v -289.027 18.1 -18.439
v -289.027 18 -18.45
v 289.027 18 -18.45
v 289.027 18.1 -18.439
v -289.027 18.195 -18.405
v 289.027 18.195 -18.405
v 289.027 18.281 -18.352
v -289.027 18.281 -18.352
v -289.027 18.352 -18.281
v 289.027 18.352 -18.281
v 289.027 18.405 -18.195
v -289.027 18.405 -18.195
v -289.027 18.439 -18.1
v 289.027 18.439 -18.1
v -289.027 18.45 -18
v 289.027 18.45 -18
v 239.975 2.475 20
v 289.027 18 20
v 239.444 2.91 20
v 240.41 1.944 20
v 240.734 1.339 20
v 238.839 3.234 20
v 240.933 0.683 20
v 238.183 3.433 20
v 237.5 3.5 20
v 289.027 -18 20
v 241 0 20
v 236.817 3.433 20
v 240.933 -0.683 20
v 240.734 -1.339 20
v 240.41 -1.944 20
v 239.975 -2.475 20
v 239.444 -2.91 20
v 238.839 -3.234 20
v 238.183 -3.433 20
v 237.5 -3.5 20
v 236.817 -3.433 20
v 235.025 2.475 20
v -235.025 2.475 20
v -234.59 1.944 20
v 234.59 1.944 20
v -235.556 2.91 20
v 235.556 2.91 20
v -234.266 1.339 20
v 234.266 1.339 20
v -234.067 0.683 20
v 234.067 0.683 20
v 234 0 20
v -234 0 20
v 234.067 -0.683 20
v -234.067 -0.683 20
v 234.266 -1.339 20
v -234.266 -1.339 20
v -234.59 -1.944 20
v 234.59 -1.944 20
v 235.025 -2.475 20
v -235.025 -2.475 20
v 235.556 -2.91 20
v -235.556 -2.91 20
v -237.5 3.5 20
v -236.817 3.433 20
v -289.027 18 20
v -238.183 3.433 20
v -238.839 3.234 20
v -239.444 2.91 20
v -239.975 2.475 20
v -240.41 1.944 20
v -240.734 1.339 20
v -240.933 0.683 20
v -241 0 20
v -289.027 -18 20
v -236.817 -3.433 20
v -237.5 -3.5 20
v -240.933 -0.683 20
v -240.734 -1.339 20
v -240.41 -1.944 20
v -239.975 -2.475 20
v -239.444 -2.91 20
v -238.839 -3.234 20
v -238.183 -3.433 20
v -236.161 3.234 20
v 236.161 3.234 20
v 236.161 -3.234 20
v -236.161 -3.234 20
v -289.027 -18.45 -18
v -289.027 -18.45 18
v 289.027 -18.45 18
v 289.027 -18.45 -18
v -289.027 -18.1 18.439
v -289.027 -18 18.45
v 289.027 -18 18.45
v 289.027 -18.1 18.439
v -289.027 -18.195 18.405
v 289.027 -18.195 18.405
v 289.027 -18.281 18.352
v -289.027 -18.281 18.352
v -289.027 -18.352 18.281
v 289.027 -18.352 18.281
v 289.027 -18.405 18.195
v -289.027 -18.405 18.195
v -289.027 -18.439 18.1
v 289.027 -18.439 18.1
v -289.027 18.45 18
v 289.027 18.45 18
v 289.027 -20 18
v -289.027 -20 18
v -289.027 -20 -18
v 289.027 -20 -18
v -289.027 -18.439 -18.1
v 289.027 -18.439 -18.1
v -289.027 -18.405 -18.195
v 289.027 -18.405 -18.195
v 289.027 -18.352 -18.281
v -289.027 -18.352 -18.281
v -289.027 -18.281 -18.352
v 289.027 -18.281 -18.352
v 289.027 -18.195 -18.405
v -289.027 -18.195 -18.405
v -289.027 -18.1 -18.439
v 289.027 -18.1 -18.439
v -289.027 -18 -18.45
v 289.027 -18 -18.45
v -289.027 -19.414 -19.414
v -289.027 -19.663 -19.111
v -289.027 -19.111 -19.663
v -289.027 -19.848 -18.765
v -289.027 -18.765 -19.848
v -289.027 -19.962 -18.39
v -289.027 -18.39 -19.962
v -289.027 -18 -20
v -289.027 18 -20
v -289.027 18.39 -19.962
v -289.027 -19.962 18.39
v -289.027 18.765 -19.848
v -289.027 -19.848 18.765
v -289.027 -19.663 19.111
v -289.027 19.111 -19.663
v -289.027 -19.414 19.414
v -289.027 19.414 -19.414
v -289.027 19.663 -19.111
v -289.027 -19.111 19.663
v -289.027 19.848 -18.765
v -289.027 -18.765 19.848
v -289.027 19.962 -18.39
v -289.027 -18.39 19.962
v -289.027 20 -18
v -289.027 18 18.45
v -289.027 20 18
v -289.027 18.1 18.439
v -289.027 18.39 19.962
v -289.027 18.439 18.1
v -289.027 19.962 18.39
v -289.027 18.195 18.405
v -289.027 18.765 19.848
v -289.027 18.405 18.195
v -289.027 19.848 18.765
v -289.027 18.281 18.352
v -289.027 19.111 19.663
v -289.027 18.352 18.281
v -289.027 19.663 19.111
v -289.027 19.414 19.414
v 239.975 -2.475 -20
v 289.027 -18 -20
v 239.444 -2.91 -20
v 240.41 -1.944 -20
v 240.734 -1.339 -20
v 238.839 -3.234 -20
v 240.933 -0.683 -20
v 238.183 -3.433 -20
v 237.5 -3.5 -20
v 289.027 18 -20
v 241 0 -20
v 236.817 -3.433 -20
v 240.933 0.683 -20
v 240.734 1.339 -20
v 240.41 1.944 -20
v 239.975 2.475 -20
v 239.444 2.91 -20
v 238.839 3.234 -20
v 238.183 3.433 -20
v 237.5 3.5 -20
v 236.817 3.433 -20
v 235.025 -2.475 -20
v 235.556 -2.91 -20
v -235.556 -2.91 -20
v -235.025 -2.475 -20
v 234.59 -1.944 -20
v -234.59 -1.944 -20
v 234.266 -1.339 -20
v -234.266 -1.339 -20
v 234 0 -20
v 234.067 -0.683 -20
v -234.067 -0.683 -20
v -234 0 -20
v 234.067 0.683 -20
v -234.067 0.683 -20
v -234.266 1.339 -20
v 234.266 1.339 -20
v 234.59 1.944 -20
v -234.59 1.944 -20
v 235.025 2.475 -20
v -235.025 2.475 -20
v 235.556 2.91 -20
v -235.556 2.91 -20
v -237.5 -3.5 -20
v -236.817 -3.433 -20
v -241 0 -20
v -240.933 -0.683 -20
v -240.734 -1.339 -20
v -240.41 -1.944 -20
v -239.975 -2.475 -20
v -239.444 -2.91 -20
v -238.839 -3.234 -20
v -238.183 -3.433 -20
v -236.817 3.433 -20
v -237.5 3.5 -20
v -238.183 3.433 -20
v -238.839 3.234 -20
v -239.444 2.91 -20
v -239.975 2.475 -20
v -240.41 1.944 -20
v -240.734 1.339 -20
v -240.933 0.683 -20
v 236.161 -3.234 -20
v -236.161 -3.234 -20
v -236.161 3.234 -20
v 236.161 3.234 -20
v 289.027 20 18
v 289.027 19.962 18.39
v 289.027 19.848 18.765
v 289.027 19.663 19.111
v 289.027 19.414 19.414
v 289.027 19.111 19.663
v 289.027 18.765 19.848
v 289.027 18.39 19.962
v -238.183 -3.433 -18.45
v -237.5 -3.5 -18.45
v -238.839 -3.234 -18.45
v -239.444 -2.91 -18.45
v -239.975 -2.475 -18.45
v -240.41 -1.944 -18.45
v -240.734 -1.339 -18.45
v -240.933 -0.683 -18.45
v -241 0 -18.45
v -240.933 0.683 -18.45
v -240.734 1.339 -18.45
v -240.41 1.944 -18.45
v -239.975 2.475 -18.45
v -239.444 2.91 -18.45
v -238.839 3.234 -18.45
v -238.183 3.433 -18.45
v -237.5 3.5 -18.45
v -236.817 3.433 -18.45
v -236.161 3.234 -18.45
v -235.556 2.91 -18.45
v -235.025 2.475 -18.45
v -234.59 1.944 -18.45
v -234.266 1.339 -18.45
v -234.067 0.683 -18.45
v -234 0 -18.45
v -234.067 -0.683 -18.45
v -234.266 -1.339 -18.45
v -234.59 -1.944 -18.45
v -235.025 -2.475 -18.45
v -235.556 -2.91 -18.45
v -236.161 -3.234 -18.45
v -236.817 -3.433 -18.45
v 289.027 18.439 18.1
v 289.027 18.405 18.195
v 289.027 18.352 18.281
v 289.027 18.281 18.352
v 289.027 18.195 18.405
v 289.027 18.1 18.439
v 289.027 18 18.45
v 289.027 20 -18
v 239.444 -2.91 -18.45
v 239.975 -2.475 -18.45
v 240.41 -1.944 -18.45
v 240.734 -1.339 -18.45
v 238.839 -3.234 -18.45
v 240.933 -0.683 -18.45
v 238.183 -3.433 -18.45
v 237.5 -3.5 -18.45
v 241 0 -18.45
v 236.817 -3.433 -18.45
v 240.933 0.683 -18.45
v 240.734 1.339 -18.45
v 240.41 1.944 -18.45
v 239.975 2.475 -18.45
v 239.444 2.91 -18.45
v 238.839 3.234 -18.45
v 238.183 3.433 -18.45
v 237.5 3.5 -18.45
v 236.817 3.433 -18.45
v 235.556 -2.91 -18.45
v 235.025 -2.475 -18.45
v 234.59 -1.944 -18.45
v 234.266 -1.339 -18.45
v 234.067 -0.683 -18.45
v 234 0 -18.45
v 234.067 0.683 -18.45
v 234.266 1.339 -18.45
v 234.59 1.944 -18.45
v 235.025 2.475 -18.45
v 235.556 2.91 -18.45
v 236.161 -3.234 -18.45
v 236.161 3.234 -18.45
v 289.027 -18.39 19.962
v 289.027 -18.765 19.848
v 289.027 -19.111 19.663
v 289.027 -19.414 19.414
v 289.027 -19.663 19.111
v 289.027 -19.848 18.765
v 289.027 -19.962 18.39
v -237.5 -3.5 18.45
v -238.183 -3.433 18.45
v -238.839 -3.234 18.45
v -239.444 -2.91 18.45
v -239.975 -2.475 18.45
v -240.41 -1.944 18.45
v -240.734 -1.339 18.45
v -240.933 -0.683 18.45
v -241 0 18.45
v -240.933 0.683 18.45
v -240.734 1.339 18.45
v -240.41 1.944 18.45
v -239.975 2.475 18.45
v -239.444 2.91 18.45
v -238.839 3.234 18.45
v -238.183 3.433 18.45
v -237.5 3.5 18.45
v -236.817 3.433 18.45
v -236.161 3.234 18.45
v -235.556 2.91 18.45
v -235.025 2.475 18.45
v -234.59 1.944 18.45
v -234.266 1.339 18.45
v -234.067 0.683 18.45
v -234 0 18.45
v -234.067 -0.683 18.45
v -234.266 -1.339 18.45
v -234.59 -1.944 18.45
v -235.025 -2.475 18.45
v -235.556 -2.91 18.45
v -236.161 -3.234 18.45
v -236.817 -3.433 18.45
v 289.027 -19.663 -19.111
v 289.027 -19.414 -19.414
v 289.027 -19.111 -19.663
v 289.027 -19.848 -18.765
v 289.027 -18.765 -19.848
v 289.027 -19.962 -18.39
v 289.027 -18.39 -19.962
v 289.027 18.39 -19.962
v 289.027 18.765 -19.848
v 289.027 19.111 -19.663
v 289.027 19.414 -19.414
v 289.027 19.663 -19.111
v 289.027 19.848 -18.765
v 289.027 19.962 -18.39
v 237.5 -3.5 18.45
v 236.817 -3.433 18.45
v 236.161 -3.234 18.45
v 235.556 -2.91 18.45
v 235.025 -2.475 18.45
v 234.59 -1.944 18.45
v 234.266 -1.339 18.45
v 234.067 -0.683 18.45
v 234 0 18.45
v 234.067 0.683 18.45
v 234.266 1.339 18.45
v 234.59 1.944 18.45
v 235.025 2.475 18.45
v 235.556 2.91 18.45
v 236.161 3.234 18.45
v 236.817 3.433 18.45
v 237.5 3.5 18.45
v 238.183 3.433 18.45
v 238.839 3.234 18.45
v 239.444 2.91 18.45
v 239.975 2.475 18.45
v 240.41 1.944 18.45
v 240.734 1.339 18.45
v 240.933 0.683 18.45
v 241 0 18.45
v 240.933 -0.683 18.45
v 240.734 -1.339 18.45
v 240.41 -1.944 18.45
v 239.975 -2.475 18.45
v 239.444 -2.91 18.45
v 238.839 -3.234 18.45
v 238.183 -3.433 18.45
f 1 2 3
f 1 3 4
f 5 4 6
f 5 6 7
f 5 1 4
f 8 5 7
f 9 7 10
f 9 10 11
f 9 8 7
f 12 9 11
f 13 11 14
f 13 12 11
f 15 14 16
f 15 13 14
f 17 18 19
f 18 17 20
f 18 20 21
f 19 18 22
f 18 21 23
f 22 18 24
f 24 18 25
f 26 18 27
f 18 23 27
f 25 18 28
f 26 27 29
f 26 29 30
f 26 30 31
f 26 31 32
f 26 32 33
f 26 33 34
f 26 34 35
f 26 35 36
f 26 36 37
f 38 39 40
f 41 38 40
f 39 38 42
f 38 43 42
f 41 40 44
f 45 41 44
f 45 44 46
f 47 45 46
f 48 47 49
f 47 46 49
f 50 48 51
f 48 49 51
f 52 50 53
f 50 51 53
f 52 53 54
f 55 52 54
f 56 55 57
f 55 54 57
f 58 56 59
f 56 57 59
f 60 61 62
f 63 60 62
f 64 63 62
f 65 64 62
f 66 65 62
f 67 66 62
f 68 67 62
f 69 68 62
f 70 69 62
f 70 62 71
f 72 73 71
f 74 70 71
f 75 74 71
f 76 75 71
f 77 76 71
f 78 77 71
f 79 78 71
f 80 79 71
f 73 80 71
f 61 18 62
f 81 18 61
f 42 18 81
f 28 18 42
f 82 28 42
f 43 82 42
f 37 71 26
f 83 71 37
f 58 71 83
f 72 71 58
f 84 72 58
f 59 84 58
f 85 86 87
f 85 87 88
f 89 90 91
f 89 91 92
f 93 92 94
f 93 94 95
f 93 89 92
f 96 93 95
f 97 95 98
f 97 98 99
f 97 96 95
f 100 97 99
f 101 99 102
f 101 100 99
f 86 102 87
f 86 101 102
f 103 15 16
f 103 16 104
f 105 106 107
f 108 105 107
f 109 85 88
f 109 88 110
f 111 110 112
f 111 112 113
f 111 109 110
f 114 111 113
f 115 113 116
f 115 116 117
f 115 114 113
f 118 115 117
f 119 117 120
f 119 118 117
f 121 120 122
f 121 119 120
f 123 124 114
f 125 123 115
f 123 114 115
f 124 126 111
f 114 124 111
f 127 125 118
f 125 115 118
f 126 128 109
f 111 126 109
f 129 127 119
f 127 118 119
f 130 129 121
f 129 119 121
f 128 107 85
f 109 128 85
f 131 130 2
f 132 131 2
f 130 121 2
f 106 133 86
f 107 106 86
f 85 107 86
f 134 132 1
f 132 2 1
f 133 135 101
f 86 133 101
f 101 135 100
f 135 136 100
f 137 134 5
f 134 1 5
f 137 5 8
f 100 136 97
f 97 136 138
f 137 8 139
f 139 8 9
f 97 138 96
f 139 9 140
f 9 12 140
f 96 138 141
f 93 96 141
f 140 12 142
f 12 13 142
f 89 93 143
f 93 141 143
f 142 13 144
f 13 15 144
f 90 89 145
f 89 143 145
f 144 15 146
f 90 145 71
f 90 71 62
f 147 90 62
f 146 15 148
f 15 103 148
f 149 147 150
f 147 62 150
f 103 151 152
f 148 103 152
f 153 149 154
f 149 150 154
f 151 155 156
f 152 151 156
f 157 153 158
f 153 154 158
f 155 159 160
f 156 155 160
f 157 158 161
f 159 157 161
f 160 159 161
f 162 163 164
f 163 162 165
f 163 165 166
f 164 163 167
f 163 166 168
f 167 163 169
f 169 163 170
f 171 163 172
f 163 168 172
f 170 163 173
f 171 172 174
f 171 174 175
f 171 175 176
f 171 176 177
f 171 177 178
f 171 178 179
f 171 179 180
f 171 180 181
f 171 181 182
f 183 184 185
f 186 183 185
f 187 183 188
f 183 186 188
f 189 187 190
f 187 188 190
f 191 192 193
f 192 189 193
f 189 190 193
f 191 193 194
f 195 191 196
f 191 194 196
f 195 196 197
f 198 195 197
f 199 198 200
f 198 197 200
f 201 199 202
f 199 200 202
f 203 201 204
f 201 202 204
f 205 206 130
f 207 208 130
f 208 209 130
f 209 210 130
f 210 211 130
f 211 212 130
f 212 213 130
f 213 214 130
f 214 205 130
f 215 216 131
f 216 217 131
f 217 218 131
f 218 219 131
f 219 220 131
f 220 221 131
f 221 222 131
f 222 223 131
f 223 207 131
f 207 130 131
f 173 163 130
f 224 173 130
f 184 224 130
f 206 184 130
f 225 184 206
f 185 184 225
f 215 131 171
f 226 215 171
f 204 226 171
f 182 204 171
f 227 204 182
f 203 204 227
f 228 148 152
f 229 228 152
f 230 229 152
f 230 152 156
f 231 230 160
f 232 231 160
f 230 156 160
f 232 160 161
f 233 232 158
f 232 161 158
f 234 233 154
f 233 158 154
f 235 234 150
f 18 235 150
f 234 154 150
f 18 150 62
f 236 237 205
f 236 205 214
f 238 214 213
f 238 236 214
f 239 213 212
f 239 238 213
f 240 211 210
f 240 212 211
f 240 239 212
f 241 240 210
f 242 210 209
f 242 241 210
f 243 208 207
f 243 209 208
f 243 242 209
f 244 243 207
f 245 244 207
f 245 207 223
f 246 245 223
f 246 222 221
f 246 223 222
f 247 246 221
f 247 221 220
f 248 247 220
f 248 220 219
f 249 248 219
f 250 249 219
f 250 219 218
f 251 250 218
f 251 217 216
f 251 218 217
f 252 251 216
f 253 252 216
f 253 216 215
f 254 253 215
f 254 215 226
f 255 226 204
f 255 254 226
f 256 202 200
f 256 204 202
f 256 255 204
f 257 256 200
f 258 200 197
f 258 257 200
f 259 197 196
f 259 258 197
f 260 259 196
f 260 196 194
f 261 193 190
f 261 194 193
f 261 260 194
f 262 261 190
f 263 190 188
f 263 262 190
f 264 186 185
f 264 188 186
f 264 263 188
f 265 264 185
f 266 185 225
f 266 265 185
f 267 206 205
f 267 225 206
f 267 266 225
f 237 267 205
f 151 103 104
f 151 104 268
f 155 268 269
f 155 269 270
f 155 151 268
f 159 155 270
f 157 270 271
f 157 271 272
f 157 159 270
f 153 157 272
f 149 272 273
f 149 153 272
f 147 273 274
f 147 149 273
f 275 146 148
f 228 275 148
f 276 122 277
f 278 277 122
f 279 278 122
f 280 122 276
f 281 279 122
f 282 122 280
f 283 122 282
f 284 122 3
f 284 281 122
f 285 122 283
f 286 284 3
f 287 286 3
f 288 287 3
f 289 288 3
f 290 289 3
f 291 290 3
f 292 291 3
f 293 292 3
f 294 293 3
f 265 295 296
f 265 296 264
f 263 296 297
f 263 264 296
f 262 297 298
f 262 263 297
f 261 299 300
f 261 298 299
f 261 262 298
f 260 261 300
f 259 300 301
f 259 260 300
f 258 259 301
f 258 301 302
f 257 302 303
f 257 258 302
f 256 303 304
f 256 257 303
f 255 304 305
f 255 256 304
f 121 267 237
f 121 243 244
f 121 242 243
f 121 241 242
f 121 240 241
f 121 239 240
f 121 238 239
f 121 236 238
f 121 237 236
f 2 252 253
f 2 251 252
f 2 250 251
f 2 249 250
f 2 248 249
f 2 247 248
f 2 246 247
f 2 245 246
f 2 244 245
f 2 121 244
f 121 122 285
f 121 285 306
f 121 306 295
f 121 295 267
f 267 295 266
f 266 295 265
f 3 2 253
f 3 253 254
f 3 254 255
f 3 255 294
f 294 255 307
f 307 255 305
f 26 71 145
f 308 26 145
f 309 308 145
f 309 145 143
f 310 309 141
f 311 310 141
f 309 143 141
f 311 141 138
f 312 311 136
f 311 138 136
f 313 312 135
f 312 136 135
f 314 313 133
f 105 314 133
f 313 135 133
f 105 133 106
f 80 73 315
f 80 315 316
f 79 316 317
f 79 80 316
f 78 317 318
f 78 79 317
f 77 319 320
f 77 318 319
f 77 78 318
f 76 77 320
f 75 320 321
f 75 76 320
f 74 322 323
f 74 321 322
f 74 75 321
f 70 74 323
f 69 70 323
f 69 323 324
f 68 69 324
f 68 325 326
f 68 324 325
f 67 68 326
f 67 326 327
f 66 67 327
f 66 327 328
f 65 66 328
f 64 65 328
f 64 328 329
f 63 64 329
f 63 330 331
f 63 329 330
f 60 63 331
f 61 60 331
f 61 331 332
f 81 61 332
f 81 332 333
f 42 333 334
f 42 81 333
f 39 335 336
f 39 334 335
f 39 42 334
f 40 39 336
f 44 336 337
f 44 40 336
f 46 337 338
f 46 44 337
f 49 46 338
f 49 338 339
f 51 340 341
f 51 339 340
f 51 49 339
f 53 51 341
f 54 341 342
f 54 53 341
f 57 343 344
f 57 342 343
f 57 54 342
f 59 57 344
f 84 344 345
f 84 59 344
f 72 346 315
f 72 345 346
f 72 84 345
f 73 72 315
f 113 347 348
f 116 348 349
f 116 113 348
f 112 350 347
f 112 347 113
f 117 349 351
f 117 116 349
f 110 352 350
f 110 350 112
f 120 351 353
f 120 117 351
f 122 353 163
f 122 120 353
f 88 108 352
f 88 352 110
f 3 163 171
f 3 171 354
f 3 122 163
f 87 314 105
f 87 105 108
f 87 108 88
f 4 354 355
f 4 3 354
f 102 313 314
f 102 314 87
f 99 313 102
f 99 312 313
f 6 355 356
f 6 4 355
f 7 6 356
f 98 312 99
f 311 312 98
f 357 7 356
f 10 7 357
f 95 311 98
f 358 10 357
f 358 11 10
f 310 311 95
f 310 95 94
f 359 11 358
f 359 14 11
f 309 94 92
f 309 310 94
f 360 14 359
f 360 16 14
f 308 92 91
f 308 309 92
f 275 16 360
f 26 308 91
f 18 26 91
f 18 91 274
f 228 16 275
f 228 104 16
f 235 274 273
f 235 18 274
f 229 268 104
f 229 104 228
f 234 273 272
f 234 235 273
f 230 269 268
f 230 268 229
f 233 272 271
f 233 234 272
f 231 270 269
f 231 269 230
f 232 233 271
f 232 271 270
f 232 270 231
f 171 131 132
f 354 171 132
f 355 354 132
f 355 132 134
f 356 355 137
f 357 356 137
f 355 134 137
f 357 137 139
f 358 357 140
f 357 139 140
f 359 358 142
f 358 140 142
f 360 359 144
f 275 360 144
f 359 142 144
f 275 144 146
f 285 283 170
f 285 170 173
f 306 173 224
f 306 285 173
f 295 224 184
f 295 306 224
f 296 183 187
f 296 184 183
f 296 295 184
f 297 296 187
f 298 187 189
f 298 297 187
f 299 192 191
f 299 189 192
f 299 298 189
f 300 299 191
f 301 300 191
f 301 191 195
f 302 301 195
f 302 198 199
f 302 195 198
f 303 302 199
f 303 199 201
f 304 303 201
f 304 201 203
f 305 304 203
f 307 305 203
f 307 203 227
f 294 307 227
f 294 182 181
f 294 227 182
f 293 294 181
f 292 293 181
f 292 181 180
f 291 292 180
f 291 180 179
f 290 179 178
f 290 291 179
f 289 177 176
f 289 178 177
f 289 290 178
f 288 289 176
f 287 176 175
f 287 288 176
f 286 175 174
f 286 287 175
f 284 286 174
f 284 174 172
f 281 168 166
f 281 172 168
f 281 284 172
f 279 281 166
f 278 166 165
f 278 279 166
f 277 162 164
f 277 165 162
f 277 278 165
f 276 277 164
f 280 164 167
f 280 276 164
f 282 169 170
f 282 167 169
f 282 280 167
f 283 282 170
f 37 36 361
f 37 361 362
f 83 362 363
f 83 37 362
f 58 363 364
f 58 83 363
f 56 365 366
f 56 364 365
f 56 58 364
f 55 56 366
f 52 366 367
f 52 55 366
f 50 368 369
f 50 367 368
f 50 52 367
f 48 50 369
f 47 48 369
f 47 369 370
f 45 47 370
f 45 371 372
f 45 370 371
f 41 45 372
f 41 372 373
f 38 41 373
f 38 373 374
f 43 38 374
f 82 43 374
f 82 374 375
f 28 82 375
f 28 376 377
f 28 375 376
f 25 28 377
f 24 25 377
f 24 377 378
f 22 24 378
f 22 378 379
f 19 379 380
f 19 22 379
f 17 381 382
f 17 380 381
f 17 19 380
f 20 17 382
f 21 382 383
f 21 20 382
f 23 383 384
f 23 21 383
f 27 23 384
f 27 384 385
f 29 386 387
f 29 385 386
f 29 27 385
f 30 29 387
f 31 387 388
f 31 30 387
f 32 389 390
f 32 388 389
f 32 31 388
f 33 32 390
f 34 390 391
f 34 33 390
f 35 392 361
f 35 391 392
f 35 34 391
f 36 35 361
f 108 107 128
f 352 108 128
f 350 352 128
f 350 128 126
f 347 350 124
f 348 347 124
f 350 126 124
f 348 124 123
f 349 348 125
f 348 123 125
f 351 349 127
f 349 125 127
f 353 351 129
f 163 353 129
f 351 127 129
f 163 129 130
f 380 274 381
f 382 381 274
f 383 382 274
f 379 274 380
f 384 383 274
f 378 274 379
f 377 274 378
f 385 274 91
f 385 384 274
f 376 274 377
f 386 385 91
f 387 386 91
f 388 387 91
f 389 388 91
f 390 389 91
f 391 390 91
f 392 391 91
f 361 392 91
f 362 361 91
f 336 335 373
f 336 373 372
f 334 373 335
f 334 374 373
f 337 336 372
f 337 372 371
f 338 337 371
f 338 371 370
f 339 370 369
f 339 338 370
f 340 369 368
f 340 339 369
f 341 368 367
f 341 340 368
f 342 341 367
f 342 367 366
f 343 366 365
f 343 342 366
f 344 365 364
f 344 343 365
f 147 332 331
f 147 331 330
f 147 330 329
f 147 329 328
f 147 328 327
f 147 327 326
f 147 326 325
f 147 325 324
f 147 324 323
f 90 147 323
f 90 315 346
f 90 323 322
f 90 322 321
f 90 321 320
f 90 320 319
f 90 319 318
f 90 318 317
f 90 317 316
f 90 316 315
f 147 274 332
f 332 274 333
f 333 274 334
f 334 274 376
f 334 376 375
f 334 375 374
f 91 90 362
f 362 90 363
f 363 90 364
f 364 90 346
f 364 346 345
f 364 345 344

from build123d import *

# Parameters (mm, degrees)
QUADRADO_40_X_40_X_1_55_1_DEPTH = 578.0536
CORTE_EXTRUS_O1_DEPTH           = 293.466222183
CORTE_EXTRUS_O1_DEPTH_BACK      = 293.466222183
ESBO_O4_R                       = 3.5


with BuildPart() as part:
    # Esboço1 → Quadrado 40 X 40 X 1,55(1) (new body)
    with BuildSketch(Plane.YZ.offset(-289.0268)):
        with BuildLine():
            Line((-18, -20), (18, -20))
            ThreePointArc((18, -20), (19.414213562, -19.414213562), (20, -18))
            Line((20, -18), (20, 18))
            ThreePointArc((20, 18), (19.414213562, 19.414213562), (18, 20))
            Line((18, 20), (-18, 20))
            ThreePointArc((-18, 20), (-19.414213562, 19.414213562), (-20, 18))
            Line((-20, 18), (-20, -18))
            ThreePointArc((-20, -18), (-19.414213562, -19.414213562), (-18, -20))
        make_face()
        with BuildLine():
            Line((-18, -18.45), (18, -18.45))
            ThreePointArc((18, -18.45), (18.318198052, -18.318198052), (18.45, -18))
            Line((18.45, -18), (18.45, 18))
            ThreePointArc((18.45, 18), (18.318198052, 18.318198052), (18, 18.45))
            Line((18, 18.45), (-18, 18.45))
            ThreePointArc((-18, 18.45), (-18.318198052, 18.318198052), (-18.45, 18))
            Line((-18.45, 18), (-18.45, -18))
            ThreePointArc((-18.45, -18), (-18.318198052, -18.318198052), (-18, -18.45))
        make_face(mode=Mode.SUBTRACT)
    extrude(amount=QUADRADO_40_X_40_X_1_55_1_DEPTH)

    # Esboço4 → Corte-extrusão1 (cut, two sides: drawn at the far end of the back side and taken through both)
    with BuildSketch(Plane(origin=(0, 0, -20), x_dir=(-1, 0, 0), z_dir=(0, 0, -1)).offset(-CORTE_EXTRUS_O1_DEPTH_BACK)):
        with Locations(Location((-237.5, 0, 0), (0, 0, 270))):
            Circle(ESBO_O4_R)
        with Locations(Location((237.5, 0, 0), (0, 0, 270))):
            Circle(ESBO_O4_R)
    extrude(amount=CORTE_EXTRUS_O1_DEPTH + CORTE_EXTRUS_O1_DEPTH_BACK, mode=Mode.SUBTRACT)


solid = part.part
